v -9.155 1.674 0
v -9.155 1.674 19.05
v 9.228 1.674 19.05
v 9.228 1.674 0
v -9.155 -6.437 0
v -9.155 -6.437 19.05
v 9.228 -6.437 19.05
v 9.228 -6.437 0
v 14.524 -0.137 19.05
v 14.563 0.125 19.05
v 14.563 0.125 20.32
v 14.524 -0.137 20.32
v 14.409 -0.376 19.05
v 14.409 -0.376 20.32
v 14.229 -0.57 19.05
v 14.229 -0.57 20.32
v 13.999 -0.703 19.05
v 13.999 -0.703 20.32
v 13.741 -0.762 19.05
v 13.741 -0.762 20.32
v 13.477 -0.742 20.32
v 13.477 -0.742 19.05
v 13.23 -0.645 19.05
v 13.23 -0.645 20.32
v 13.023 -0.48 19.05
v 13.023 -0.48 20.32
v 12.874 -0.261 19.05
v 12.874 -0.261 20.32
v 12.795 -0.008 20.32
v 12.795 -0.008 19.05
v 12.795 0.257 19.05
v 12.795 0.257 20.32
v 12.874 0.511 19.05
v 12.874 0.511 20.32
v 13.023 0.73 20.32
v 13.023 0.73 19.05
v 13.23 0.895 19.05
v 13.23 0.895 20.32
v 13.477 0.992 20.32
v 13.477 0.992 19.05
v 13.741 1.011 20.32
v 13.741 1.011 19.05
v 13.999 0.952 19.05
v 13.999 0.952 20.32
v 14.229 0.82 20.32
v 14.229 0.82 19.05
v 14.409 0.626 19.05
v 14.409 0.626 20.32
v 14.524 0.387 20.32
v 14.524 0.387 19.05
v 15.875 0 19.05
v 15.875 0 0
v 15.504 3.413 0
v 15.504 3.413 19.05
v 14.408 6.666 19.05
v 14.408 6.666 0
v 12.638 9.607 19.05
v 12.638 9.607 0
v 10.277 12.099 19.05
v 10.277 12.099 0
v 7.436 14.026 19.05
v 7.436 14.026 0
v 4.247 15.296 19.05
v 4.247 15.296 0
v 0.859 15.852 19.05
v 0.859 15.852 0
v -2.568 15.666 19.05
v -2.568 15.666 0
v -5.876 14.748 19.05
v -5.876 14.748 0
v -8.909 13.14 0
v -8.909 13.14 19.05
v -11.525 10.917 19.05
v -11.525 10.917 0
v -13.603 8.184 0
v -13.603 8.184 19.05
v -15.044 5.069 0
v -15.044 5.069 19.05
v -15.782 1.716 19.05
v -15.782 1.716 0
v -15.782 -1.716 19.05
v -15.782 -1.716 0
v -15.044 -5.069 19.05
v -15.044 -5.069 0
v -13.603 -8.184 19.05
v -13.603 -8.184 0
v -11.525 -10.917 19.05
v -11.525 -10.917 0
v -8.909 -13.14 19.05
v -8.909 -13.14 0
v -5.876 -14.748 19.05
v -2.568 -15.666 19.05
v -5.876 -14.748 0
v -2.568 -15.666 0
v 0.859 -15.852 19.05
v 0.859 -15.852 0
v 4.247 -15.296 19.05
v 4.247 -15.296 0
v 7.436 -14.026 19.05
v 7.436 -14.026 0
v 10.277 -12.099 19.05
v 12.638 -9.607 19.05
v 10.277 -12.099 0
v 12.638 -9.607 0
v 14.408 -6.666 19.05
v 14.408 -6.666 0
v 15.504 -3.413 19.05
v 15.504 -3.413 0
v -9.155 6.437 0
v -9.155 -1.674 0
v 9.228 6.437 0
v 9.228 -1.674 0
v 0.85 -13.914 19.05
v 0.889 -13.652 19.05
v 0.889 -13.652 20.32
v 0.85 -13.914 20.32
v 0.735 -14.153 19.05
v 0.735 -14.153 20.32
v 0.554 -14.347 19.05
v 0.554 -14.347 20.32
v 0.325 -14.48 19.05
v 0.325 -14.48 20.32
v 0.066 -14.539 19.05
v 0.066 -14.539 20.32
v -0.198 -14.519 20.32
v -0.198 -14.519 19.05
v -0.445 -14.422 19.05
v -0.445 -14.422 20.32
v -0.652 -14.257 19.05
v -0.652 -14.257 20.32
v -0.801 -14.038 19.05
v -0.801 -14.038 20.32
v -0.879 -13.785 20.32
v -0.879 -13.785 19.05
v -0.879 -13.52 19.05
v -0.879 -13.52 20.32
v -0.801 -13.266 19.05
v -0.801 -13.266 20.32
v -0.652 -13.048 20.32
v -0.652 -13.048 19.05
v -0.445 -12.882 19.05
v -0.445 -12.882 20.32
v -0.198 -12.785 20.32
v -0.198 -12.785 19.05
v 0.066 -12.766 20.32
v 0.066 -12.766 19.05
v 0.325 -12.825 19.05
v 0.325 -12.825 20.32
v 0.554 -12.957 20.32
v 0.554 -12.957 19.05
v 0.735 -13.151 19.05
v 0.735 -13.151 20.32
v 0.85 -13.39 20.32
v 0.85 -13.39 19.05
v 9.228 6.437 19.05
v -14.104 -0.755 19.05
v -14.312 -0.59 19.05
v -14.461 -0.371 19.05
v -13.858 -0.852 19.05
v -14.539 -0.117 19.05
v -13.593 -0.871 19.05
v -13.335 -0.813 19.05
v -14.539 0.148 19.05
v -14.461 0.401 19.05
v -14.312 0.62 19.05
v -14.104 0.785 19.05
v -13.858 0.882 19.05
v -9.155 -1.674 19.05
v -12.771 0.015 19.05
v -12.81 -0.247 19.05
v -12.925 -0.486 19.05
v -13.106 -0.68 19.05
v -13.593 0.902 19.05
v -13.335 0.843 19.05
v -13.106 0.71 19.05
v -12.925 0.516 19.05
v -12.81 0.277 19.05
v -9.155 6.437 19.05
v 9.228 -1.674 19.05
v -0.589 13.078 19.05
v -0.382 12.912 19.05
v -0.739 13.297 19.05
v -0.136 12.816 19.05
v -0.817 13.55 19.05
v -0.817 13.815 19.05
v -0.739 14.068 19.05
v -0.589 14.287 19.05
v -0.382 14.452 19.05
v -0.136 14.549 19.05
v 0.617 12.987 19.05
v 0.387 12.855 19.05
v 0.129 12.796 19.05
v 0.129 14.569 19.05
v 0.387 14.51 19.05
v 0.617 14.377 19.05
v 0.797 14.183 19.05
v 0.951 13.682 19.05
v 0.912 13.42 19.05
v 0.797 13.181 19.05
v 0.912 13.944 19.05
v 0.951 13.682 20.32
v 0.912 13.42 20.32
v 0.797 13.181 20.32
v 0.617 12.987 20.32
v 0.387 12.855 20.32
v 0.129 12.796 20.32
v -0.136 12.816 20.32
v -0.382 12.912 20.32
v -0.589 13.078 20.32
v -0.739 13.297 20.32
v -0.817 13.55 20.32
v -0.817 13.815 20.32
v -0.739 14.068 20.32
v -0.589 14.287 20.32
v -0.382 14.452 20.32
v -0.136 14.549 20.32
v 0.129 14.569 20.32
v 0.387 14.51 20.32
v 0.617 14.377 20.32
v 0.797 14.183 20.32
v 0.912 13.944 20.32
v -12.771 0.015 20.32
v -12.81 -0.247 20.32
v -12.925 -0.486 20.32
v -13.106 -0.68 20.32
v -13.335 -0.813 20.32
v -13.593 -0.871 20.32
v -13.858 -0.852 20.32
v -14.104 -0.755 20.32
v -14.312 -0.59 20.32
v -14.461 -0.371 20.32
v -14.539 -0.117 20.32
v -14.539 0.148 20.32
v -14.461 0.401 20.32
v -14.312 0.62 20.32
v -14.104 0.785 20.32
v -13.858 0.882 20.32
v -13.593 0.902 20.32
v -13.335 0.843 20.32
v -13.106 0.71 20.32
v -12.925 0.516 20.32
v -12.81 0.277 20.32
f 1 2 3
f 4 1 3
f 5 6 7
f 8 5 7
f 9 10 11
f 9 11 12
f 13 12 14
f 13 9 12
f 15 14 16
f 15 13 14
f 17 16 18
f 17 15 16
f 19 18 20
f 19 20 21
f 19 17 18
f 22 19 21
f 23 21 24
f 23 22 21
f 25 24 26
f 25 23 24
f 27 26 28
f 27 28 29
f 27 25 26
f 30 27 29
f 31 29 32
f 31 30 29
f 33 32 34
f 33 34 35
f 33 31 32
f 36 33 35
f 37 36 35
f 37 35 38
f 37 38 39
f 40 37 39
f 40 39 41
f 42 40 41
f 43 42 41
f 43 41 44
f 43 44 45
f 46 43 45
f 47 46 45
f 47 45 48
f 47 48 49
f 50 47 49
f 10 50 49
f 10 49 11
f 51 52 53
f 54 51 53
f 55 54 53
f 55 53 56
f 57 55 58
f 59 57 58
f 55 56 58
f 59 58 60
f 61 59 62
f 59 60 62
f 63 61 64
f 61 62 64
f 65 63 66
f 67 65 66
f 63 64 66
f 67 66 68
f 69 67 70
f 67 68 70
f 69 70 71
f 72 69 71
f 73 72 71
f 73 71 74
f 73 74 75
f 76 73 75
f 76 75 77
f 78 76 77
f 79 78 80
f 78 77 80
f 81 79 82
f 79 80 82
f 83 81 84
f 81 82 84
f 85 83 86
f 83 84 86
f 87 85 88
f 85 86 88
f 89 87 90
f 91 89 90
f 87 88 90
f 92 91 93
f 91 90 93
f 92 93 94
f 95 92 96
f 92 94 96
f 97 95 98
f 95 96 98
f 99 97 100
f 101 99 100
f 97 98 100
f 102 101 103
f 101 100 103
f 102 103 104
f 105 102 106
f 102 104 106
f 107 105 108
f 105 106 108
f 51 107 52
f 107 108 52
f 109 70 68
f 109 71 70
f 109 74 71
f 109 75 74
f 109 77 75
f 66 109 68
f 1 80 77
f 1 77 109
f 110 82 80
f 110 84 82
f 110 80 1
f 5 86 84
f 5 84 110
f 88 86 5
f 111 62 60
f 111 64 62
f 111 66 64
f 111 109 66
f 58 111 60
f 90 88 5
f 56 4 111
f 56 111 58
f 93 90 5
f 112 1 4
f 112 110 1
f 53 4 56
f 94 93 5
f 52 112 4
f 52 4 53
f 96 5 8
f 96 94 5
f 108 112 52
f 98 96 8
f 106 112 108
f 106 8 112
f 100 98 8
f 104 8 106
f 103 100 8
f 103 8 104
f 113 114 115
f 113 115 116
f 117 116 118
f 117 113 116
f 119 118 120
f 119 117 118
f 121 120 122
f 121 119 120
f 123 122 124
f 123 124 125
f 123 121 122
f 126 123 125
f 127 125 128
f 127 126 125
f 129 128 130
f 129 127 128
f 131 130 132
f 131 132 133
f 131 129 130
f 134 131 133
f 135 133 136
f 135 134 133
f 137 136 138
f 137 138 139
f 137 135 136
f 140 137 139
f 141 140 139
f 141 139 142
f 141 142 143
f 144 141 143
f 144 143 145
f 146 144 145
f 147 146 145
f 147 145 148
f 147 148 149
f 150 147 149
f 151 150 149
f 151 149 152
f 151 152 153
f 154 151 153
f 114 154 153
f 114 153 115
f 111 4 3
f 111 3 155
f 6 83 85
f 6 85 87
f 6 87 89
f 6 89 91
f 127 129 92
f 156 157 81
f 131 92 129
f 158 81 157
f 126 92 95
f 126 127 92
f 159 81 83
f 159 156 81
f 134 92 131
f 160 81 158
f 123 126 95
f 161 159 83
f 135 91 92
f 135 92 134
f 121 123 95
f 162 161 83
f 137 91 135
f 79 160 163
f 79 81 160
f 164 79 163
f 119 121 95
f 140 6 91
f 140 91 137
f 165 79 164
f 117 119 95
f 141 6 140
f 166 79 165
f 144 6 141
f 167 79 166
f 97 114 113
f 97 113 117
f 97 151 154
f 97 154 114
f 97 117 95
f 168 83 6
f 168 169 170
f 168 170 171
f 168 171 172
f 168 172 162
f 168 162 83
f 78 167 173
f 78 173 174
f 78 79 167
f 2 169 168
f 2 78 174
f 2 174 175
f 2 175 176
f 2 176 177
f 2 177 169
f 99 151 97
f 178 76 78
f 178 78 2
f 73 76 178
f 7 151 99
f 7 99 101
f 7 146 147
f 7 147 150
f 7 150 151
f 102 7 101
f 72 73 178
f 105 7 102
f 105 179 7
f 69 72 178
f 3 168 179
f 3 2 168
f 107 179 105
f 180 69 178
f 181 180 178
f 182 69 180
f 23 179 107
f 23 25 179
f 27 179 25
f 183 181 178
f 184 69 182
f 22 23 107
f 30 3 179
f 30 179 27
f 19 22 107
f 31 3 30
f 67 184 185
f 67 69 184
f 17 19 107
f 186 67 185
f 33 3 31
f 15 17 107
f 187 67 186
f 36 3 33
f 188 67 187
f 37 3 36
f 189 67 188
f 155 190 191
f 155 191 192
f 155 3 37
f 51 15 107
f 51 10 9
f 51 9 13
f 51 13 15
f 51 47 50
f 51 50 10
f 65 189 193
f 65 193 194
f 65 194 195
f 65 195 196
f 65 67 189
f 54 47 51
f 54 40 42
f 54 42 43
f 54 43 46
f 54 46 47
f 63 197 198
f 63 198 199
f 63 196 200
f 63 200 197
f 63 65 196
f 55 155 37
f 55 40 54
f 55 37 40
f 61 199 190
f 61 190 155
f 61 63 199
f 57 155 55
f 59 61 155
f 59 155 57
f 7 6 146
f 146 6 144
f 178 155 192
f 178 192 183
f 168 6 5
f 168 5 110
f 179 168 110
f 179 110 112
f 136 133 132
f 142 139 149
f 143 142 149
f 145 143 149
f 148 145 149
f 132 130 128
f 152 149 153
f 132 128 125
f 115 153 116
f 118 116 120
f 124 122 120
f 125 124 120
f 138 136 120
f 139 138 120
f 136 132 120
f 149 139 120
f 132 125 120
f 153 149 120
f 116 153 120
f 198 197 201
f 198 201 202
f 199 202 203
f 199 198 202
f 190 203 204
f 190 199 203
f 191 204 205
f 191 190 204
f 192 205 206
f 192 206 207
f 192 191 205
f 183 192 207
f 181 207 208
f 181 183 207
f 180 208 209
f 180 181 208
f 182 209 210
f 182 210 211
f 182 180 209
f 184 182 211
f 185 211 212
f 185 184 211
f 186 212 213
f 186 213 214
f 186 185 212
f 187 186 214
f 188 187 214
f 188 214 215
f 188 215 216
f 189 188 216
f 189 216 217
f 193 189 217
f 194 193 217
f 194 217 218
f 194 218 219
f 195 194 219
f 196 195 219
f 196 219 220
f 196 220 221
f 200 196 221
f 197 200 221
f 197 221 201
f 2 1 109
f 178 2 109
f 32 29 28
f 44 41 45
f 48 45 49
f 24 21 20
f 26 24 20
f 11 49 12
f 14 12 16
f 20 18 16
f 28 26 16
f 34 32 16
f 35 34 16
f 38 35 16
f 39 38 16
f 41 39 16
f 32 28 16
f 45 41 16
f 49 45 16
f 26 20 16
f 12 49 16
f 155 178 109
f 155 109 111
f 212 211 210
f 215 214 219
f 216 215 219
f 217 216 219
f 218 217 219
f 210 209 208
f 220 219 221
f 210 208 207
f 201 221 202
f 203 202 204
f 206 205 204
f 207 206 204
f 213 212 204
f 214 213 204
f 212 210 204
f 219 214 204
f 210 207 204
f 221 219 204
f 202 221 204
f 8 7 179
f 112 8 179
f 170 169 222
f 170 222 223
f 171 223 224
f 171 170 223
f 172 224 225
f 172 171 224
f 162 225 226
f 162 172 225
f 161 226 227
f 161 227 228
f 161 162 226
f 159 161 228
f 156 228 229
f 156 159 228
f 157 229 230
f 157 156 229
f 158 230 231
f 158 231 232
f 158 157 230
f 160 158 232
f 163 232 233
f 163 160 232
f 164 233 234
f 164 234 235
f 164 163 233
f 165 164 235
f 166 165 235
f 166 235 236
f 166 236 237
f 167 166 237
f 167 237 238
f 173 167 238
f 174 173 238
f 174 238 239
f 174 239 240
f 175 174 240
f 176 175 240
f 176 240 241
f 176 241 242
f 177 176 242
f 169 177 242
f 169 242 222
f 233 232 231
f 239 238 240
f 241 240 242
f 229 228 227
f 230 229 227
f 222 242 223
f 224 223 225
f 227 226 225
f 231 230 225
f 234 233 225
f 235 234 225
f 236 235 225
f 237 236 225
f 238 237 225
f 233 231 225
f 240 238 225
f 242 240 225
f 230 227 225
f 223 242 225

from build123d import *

# Parameters (mm, degrees)
F0_R     = 15.875
F1_DEPTH = 19.05
F6_W     = 18.382654
F6_H     = 4.7625
F7_DEPTH = 19.05
F3_R     = 0.889
F8_DEPTH = 20.32


with BuildPart() as f1:
    # F0 (on Top) → F1 (new body)
    with BuildSketch(Plane.XY):
        Circle(F0_R)
    extrude(amount=F1_DEPTH)

    # F6 (on face) → F7 (cut)
    with BuildSketch(Plane.XY.offset(19.05)):
        with Locations((0.03649, 4.055353)):
            Rectangle(F6_W, F6_H)
        with Locations((0.03649, -4.055353)):
            Rectangle(F6_W, F6_H)
    extrude(amount=-F7_DEPTH, mode=Mode.SUBTRACT)

    # F3 (on face) → F8 (join)
    with BuildSketch(Plane(origin=(0, 0, 0), x_dir=(1, 0, 0), z_dir=(0, 0, -1))):
        with Locations((0, 13.652203)):
            Circle(F3_R)
        with Locations((-13.659894, -0.015021)):
            Circle(F3_R)
        with Locations((0.062219, -13.682245)):
            Circle(F3_R)
        with Locations((13.674476, -0.124876)):
            Circle(F3_R)
    extrude(amount=-F8_DEPTH)


solid = f1.part
